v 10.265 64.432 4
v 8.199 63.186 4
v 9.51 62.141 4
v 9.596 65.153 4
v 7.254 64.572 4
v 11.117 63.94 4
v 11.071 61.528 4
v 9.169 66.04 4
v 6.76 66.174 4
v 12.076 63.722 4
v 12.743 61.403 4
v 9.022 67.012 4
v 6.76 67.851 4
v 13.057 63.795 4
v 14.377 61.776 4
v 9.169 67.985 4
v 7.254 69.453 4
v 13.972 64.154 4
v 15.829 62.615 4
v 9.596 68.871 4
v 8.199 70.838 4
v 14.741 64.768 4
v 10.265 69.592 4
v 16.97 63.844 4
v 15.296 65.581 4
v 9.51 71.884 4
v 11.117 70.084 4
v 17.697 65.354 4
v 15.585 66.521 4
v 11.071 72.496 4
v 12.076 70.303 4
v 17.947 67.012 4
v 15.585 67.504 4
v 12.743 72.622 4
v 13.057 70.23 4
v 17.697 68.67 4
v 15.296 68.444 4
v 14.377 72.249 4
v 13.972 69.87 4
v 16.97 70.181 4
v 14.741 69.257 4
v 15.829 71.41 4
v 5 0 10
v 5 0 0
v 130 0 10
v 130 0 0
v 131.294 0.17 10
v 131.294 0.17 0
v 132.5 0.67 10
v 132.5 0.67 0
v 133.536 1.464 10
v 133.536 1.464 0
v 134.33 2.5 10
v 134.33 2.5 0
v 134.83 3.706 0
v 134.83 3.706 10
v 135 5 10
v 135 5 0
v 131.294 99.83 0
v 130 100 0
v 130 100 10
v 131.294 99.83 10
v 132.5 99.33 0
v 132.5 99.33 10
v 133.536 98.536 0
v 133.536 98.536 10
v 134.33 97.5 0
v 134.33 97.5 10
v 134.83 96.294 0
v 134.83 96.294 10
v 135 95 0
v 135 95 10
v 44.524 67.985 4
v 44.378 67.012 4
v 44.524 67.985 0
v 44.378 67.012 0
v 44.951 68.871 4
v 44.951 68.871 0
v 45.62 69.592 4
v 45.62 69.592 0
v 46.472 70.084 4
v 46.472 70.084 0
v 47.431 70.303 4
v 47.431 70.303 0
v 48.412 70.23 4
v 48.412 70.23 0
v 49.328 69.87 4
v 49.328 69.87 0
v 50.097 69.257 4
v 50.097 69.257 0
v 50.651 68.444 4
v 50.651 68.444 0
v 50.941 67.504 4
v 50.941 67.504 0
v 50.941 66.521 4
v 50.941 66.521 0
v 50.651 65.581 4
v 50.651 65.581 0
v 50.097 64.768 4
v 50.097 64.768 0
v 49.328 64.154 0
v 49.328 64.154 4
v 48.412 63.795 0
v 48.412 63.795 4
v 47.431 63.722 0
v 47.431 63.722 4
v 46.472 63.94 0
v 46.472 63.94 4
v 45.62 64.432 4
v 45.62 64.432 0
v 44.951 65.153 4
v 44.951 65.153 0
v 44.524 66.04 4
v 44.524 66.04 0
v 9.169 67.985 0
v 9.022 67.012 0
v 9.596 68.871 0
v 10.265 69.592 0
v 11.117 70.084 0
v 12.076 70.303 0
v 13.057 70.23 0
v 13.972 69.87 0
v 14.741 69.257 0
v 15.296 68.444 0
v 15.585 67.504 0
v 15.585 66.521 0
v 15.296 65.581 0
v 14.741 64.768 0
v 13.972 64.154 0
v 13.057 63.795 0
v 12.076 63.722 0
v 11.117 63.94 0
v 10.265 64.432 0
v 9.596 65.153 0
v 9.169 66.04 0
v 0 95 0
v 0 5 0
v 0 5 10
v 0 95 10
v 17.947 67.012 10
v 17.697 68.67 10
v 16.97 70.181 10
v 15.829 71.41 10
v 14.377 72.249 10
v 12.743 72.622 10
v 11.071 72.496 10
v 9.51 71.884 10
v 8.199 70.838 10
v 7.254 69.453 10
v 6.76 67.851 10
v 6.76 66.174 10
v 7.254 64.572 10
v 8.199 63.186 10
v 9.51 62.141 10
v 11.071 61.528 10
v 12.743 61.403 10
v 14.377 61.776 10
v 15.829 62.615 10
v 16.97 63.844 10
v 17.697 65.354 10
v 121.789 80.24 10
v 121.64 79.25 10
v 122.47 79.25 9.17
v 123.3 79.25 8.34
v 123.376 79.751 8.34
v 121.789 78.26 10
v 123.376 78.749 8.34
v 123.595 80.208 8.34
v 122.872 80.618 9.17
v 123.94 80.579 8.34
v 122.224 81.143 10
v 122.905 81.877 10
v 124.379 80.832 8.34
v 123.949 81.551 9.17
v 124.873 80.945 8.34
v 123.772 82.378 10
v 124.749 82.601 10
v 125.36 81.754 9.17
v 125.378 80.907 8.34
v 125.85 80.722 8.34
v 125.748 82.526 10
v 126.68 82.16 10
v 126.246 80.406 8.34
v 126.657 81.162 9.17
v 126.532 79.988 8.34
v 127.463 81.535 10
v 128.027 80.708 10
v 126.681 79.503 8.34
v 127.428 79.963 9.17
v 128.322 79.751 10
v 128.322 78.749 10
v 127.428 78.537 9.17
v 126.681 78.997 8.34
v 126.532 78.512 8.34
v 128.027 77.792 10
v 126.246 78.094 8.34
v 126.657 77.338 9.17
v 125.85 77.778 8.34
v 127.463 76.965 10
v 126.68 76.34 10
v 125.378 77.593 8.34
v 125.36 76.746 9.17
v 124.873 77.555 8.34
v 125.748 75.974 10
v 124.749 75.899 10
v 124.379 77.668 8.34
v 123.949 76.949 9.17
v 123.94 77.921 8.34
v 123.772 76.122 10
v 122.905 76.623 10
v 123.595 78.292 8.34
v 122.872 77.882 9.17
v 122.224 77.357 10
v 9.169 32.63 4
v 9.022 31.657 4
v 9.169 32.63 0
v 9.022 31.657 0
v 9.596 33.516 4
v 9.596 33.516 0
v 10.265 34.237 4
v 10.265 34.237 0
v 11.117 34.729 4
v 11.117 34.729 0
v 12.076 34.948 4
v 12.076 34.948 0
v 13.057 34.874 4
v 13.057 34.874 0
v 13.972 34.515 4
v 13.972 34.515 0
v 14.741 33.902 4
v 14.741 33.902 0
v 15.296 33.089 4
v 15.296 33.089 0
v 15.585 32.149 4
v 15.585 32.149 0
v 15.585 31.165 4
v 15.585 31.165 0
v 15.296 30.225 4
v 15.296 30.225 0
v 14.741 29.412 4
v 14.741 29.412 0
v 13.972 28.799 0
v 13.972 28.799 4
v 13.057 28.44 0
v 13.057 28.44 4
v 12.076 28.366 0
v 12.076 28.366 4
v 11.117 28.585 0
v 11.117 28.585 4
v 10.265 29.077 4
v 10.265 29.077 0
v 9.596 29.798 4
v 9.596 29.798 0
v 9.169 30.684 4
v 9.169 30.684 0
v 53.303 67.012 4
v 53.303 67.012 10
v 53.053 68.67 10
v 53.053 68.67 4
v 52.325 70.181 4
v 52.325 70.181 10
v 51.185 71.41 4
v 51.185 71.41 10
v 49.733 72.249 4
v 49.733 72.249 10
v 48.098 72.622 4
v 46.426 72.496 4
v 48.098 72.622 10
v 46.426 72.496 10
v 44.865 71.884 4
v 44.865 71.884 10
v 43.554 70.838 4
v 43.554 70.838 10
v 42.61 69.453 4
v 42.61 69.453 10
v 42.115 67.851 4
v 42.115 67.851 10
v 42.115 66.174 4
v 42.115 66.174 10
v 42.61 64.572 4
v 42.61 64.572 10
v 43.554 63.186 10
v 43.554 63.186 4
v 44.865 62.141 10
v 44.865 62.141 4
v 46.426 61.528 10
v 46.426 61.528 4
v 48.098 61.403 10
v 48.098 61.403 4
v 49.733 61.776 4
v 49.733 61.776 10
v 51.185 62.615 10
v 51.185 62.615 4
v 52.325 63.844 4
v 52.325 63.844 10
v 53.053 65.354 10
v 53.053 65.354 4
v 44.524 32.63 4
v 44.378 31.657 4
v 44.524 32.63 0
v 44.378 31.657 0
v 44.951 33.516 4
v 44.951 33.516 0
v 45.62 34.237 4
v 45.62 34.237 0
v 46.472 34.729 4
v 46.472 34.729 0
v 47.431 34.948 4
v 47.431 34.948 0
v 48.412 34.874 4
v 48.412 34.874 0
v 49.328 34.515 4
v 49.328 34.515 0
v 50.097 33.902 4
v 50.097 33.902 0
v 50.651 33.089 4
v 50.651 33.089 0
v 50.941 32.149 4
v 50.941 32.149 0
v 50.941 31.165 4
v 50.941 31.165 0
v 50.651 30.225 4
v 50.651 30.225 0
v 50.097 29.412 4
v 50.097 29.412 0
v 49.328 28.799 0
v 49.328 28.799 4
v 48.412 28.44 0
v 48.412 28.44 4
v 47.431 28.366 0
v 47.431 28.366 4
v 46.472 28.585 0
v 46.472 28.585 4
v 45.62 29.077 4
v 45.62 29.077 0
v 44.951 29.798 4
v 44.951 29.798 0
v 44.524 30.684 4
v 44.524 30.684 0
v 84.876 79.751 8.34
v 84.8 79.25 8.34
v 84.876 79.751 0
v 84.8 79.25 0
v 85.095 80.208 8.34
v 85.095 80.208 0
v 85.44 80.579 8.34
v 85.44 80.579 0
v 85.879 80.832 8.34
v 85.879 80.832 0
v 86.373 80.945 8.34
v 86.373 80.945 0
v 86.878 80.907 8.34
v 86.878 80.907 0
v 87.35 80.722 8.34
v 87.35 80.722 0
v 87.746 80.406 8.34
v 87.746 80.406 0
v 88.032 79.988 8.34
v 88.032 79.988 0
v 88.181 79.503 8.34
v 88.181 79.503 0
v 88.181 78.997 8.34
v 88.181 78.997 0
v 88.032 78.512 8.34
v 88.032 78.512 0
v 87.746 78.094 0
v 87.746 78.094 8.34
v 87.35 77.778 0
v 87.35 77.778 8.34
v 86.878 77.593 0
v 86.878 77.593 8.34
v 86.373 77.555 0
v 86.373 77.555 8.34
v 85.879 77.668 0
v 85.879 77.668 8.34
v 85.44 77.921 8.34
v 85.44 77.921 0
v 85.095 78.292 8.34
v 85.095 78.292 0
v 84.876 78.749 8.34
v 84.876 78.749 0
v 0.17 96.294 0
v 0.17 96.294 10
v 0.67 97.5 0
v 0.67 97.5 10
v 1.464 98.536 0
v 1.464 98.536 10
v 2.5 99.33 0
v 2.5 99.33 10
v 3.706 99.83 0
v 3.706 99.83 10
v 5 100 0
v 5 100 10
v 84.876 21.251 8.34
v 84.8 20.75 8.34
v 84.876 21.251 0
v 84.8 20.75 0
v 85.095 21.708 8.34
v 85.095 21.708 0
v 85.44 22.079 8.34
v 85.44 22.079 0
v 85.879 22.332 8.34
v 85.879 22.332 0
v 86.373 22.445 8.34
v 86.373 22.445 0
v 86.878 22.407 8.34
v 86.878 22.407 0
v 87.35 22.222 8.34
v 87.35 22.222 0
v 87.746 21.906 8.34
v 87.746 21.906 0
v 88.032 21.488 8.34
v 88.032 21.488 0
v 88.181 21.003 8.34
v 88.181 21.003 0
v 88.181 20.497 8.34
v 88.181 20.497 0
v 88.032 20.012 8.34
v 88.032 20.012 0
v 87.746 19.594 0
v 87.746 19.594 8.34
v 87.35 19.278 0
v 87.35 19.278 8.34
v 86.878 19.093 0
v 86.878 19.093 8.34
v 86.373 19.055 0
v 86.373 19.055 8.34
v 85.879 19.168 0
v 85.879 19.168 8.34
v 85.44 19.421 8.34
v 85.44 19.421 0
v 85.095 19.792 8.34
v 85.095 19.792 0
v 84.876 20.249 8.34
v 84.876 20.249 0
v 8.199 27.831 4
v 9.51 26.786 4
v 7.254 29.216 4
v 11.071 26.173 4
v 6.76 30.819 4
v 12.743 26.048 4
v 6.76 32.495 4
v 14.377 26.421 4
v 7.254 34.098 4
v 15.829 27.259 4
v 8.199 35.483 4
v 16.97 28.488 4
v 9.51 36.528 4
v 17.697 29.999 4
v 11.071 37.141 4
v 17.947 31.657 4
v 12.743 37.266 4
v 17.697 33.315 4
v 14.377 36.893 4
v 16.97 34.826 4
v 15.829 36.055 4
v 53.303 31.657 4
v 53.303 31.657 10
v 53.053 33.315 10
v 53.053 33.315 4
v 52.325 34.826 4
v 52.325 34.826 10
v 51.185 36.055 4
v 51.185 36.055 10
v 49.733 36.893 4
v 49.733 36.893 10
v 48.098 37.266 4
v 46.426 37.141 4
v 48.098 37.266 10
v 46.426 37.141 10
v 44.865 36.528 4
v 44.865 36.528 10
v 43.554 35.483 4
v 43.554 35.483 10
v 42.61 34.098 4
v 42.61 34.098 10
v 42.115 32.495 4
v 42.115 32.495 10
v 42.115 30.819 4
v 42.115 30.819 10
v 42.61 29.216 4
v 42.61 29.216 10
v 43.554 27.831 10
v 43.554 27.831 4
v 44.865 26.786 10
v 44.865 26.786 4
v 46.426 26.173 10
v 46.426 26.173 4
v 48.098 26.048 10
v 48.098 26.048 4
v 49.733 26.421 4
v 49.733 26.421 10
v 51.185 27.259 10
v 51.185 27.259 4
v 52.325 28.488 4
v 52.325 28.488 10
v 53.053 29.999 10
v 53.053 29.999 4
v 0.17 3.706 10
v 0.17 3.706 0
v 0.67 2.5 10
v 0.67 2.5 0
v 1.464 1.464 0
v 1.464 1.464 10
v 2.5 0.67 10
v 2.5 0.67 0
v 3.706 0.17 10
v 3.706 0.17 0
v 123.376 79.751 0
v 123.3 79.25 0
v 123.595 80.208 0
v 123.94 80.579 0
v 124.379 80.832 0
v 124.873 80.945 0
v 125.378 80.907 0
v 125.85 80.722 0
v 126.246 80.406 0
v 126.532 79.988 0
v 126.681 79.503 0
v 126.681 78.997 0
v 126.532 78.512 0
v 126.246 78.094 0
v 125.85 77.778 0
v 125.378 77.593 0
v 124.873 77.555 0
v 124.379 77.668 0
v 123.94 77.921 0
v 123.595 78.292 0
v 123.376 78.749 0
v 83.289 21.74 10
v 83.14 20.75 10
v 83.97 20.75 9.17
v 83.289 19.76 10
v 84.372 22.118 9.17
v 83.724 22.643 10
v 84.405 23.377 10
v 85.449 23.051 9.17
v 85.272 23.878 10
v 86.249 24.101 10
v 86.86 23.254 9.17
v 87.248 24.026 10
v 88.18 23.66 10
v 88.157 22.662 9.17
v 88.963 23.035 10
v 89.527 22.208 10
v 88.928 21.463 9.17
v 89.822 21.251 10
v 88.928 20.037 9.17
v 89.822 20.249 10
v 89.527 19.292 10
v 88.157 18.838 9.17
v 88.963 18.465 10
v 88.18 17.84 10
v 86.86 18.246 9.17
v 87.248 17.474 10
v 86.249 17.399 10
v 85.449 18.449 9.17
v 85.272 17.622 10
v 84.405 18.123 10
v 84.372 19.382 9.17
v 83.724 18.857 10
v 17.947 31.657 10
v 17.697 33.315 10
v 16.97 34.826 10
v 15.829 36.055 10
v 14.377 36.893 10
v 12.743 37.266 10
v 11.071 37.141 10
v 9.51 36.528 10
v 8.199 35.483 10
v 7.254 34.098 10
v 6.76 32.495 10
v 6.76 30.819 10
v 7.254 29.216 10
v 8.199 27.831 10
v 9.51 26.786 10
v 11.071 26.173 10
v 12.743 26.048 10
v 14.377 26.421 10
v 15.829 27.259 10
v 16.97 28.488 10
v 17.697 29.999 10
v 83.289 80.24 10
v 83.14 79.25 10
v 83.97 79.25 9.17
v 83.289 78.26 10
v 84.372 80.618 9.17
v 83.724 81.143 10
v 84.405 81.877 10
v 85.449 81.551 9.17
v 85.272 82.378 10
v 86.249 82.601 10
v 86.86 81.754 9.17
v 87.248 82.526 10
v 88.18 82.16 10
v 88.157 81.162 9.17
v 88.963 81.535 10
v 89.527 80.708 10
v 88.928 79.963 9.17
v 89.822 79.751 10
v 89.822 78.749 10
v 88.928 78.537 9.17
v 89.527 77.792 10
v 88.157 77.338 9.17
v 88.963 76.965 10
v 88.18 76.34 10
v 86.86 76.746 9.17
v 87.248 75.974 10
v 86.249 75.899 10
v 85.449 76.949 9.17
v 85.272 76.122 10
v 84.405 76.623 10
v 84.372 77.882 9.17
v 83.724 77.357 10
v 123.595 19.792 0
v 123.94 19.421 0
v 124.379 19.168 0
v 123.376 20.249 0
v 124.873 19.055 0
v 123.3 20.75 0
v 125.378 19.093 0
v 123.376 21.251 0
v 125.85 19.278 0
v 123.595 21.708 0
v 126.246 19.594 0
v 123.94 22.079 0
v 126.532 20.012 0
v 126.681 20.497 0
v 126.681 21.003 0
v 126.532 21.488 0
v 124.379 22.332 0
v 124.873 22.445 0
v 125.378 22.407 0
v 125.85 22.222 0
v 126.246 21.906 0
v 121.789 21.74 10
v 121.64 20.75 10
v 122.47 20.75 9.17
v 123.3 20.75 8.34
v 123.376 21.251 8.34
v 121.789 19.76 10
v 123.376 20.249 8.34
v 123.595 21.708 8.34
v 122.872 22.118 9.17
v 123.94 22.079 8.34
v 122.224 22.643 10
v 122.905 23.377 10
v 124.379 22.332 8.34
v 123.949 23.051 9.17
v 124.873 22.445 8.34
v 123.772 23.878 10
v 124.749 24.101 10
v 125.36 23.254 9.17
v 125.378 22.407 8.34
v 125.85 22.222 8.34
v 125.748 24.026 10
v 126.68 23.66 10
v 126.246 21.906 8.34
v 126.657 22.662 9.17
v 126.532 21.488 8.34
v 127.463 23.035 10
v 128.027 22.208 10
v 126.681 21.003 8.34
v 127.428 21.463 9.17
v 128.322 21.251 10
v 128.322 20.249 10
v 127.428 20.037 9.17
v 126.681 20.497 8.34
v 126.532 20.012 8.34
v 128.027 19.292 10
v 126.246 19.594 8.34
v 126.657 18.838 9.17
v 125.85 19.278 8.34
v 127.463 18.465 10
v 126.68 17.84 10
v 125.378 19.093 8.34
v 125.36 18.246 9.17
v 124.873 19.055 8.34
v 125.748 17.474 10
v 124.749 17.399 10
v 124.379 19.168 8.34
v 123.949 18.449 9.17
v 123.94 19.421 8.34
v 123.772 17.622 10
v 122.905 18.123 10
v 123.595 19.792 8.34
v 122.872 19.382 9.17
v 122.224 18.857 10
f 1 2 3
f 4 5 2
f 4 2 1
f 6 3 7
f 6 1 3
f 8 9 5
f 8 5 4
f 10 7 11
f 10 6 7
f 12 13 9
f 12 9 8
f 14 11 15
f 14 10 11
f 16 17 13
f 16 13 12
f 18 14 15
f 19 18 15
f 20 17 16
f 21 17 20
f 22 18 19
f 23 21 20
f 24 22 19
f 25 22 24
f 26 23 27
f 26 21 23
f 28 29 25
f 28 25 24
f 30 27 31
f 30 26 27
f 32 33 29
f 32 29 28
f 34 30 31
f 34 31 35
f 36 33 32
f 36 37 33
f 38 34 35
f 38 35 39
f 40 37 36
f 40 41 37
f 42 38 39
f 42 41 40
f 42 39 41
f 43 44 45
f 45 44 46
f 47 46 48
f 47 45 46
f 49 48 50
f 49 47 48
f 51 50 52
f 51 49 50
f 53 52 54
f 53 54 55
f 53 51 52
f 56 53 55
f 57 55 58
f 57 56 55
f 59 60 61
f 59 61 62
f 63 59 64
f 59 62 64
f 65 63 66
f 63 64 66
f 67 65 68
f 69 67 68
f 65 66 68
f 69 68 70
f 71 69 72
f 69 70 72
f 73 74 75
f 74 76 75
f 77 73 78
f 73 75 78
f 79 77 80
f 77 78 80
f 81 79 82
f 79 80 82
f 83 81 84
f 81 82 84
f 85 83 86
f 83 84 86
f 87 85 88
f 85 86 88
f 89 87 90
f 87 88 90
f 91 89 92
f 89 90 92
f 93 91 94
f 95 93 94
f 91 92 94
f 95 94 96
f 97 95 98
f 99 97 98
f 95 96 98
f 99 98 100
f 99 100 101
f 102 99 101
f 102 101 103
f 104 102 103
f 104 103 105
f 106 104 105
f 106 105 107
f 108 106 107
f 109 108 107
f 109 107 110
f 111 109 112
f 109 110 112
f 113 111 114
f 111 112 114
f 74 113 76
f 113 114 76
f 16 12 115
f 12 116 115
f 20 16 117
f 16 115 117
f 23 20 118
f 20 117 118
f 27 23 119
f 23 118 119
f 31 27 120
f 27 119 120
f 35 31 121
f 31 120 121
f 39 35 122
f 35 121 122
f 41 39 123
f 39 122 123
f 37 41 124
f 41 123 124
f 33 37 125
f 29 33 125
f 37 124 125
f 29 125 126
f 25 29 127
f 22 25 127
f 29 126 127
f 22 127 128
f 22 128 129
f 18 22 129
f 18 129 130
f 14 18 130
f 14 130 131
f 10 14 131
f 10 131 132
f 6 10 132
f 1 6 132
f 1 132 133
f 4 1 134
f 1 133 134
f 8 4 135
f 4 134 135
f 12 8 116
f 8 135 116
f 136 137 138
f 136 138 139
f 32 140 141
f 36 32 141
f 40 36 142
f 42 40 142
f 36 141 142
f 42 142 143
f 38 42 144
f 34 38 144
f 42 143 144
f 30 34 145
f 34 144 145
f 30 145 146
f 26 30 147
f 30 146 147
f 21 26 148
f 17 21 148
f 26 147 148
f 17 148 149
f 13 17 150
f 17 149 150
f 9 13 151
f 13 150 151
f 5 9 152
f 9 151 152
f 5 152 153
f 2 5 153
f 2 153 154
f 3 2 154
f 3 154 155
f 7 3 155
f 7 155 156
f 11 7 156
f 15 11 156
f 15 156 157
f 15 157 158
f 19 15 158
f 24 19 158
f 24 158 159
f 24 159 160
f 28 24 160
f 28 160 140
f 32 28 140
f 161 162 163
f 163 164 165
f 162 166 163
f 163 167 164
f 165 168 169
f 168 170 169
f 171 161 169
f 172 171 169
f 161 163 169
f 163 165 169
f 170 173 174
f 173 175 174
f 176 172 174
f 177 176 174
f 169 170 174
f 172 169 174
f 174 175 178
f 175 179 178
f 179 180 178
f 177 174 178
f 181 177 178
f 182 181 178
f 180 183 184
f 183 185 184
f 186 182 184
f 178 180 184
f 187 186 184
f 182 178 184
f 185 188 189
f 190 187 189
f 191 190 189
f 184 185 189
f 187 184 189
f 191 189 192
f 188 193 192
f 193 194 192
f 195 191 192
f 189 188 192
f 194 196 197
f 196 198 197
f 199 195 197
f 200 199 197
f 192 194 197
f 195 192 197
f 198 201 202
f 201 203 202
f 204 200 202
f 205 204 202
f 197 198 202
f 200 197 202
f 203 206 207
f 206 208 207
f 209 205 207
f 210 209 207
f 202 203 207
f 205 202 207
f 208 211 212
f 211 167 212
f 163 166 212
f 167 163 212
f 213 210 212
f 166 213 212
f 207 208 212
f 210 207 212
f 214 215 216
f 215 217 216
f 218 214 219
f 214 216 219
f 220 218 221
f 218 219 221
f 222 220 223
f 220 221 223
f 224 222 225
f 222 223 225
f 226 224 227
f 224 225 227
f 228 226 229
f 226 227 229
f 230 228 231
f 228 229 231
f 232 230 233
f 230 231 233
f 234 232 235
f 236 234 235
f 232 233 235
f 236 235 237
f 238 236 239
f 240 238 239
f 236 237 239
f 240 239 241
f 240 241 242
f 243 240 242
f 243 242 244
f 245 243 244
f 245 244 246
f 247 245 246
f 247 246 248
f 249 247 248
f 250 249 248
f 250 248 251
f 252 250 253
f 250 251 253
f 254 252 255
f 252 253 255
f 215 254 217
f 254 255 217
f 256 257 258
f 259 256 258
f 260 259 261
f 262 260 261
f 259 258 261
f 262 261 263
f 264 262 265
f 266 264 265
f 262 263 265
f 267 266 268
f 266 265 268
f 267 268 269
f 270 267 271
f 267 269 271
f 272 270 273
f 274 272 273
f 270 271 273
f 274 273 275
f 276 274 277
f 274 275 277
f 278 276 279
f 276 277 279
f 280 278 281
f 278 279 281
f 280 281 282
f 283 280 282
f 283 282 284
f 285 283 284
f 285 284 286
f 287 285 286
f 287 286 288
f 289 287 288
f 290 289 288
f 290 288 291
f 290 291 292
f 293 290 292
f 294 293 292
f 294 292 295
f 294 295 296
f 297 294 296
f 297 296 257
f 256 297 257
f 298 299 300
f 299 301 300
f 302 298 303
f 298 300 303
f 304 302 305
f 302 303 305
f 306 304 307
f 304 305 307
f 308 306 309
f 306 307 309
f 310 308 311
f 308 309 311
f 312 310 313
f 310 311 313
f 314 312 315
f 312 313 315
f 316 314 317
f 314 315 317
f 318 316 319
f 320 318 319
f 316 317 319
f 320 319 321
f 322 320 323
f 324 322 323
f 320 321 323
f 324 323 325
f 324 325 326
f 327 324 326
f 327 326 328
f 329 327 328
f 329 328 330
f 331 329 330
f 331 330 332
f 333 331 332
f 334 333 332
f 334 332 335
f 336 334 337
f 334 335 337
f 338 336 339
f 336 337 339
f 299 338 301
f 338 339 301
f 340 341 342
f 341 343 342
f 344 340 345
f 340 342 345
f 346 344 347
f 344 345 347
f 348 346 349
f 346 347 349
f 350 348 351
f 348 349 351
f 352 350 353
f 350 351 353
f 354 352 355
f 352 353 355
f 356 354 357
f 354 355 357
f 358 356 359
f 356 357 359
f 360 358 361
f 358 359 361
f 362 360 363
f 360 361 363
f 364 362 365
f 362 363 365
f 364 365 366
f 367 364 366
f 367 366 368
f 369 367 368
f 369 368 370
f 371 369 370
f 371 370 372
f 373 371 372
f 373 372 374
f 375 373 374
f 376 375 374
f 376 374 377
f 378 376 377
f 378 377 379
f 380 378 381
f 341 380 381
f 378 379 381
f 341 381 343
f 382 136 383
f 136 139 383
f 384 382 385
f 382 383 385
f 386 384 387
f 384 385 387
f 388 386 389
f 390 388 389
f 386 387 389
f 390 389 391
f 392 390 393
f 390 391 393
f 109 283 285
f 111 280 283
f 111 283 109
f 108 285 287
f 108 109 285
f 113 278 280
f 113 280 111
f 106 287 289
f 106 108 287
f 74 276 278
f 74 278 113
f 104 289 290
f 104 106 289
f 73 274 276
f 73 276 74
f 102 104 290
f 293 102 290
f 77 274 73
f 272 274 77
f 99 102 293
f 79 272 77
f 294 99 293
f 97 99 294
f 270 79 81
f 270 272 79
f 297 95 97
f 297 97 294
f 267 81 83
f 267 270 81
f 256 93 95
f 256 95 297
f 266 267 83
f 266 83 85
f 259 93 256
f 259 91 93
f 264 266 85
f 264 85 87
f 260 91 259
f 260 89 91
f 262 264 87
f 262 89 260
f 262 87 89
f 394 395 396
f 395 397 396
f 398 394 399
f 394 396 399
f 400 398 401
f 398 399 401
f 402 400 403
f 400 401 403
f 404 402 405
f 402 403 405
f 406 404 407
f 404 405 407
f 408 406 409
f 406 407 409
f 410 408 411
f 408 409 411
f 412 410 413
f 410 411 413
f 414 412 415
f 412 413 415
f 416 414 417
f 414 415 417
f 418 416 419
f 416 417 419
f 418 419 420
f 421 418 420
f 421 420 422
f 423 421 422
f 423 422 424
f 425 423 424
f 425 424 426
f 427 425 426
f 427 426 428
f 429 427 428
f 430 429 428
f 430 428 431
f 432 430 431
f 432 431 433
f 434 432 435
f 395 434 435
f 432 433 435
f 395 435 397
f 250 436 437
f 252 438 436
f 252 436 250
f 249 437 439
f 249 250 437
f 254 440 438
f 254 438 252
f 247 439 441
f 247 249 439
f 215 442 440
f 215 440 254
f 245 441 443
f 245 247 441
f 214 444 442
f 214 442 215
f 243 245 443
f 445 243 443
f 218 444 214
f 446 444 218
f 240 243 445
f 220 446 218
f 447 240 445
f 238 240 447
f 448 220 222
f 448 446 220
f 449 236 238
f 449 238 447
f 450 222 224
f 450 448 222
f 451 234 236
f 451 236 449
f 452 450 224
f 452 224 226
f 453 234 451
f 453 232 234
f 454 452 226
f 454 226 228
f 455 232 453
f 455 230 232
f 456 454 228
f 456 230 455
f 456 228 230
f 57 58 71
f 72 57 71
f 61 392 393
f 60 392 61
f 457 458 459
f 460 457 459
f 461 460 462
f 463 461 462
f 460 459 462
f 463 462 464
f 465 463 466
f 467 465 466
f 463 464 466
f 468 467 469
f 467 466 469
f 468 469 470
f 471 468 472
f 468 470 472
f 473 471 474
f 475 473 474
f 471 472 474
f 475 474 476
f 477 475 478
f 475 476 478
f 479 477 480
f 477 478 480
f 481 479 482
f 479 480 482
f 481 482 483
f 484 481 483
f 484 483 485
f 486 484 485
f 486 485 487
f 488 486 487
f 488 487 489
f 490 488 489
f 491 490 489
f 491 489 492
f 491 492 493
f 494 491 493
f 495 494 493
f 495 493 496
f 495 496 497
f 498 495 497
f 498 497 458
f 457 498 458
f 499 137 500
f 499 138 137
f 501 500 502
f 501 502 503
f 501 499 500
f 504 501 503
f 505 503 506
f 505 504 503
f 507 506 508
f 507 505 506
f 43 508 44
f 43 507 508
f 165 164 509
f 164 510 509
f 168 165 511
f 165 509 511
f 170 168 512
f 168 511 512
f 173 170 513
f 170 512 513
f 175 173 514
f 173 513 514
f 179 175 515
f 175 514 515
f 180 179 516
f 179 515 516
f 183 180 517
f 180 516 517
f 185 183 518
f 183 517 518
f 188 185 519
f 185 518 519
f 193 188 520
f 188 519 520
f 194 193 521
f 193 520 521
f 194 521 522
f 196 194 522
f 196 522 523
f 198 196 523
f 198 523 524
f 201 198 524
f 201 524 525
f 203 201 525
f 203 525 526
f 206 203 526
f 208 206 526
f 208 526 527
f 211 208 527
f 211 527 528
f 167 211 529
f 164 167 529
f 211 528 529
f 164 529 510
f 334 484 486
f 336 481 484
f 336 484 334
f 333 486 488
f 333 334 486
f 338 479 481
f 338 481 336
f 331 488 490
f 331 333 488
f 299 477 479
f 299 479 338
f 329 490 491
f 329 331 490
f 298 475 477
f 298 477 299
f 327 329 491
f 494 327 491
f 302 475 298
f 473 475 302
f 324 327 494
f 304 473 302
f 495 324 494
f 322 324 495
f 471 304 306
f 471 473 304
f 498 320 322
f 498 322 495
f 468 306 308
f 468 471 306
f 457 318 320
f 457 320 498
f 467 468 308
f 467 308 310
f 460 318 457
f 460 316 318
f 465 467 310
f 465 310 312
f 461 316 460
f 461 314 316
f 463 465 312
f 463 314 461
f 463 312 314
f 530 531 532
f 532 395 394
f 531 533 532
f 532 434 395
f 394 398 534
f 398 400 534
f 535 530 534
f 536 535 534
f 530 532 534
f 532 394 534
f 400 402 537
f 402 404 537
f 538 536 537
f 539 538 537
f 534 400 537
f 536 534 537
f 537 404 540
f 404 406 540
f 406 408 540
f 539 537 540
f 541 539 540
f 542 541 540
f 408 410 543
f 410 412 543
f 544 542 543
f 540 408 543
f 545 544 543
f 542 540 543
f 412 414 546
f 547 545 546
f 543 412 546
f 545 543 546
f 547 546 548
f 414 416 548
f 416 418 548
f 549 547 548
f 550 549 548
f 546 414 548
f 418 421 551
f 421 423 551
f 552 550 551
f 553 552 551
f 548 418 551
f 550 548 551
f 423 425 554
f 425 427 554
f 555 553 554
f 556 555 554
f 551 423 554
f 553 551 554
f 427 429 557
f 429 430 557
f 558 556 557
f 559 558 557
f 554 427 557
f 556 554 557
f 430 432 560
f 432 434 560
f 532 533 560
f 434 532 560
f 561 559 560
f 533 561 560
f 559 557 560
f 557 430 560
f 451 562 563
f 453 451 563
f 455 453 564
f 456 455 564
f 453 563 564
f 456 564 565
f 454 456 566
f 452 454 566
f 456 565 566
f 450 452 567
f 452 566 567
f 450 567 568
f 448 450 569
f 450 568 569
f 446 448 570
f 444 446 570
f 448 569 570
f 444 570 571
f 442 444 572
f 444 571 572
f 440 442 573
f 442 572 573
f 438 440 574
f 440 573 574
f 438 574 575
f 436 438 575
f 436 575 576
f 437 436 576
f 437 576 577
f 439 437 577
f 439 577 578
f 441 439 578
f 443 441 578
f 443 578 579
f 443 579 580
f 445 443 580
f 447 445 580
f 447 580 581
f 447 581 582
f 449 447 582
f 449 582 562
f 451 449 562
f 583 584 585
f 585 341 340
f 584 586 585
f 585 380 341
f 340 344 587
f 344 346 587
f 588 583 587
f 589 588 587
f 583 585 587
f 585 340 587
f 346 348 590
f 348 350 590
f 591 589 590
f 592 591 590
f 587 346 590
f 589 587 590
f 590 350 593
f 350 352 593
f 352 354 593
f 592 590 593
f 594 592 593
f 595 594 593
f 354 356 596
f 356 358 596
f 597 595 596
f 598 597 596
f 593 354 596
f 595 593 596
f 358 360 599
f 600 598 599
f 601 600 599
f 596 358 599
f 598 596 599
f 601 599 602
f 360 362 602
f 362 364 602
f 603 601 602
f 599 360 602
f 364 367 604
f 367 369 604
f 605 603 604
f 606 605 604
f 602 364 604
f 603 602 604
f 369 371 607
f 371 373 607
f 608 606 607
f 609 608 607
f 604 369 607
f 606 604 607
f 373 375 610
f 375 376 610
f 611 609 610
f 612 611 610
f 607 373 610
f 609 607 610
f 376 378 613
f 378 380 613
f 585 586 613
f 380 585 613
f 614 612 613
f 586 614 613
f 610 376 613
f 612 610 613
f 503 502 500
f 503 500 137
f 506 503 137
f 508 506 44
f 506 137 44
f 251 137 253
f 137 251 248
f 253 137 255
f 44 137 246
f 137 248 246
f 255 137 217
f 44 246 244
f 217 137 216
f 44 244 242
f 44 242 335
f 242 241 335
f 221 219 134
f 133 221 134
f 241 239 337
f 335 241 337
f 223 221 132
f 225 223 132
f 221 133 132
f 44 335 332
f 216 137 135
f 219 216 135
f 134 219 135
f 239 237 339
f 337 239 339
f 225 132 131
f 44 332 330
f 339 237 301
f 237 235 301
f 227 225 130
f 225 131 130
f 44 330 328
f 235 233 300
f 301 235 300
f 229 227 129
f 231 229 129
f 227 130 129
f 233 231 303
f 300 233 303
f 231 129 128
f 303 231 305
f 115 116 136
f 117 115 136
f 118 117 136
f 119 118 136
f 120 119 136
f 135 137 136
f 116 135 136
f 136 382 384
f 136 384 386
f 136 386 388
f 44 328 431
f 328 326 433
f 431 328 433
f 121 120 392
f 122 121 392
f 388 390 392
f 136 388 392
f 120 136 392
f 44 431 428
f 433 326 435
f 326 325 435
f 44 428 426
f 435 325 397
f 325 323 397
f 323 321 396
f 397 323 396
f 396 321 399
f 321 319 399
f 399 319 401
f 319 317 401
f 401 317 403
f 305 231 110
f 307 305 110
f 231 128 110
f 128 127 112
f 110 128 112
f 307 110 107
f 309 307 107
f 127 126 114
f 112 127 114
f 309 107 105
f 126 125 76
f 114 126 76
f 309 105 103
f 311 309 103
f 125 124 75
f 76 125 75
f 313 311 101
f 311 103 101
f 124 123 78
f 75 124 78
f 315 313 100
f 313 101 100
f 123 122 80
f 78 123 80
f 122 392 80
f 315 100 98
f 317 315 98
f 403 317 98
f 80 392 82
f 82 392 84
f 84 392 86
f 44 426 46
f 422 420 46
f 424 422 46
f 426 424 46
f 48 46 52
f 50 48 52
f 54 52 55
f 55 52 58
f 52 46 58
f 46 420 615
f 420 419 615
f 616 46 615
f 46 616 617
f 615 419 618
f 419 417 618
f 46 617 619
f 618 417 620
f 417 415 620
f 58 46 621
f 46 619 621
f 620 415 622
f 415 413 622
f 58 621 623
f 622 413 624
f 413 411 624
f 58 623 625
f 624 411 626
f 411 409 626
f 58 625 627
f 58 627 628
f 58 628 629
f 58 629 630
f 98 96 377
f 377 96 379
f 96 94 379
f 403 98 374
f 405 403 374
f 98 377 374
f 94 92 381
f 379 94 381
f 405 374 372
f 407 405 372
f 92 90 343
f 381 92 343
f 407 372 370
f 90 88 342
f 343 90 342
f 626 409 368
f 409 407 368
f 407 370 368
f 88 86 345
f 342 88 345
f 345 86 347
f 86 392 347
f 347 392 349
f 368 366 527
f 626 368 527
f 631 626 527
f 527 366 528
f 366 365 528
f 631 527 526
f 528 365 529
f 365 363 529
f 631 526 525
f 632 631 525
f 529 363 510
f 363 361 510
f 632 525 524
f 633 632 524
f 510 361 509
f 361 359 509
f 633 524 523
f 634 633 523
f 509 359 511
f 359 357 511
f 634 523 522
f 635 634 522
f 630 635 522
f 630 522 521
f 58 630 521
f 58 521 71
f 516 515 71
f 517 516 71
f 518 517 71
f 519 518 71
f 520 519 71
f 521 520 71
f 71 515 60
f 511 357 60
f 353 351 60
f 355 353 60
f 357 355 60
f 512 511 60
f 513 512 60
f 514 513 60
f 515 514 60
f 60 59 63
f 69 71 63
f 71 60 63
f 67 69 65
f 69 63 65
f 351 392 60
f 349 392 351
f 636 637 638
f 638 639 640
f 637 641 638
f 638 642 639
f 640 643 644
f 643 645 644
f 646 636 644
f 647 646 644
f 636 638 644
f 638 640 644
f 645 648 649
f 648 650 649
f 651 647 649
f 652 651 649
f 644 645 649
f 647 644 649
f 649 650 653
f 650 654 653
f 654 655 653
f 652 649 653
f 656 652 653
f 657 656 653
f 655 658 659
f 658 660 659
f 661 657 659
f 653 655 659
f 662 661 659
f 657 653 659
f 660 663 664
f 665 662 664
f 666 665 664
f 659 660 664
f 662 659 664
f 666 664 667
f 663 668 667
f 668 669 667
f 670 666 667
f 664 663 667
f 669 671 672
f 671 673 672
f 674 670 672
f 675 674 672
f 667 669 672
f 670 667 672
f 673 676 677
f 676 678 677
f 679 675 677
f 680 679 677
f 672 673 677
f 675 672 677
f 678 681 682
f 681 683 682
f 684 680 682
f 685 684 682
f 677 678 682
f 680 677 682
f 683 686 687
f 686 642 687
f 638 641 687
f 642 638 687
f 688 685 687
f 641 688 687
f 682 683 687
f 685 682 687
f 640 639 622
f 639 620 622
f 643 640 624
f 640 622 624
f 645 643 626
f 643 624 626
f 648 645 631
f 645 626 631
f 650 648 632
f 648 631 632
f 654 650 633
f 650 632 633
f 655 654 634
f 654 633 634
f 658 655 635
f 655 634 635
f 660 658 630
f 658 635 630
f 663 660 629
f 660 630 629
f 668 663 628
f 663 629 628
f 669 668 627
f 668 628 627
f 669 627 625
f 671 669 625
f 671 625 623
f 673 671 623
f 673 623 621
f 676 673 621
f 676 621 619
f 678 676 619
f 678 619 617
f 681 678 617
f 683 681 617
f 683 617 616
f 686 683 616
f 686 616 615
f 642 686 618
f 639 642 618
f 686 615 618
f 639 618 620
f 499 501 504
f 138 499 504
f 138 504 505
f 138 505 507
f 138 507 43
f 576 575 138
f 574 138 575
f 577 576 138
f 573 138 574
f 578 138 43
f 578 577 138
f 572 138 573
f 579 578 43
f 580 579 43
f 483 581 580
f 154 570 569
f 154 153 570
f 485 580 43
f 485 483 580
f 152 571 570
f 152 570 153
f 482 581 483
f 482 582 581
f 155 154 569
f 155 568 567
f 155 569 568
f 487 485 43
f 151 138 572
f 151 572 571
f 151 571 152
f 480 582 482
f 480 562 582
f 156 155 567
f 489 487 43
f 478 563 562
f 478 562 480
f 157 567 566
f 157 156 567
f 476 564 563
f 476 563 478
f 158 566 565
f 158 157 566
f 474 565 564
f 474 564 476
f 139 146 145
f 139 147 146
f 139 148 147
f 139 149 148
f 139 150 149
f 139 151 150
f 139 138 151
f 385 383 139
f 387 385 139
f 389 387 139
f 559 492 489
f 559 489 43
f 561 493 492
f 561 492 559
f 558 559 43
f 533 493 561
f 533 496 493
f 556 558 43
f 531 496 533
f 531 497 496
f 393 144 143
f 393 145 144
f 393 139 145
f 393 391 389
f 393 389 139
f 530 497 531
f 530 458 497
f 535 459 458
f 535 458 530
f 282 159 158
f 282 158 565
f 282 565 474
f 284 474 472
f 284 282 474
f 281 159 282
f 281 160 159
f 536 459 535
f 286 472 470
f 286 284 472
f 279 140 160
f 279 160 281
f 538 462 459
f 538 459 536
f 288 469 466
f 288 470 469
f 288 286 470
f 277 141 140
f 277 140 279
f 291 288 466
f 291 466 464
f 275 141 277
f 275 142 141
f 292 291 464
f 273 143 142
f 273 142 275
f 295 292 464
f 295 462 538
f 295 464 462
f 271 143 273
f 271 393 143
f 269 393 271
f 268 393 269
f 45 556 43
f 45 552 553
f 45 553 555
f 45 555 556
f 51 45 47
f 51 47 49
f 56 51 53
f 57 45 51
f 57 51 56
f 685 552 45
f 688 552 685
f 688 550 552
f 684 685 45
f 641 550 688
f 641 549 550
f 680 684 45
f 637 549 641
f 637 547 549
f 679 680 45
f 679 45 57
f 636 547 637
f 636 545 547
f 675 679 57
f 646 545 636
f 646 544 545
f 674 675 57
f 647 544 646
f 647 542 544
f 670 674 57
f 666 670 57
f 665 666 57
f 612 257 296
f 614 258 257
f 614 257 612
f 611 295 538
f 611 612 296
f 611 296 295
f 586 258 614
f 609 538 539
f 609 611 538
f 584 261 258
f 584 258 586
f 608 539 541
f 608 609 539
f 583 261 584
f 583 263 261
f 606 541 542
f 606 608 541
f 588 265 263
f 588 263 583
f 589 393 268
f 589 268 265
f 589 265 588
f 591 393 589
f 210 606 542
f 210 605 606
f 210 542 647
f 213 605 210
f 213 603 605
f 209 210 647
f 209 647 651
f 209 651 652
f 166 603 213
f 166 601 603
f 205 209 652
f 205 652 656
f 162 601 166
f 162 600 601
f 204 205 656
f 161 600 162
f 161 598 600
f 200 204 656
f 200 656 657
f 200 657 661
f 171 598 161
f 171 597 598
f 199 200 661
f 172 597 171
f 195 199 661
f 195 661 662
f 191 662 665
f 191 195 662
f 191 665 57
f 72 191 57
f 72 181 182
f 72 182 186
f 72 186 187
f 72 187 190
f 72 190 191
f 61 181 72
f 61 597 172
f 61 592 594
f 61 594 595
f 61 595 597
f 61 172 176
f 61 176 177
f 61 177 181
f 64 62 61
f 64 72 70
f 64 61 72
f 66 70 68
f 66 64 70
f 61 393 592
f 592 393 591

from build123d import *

# Parameters (mm, degrees)
F0_W           = 135
F0_H           = 100
F1_DEPTH       = 10
F4_D           = 6.6
F4_CBORE_D     = 11.25
F4_CBORE_DEPTH = 6
F5_R           = 5
F7_D           = 3.4
F7_CSINK_D     = 6.72
F7_CSINK_ANGLE = 90


with BuildPart() as f1:
    # F0 (on Top) → F1 (new body)
    with BuildSketch(Plane.XY):
        with Locations((67.5, 50)):
            Rectangle(F0_W, F0_H)
    extrude(amount=F1_DEPTH)

    # F4 (through all)
    with Locations(Plane.XY.offset(10)):
        with Locations((12.3223304703, 67.0123483286), (47.6776695297, 67.0123483286), (47.6776695297, 31.6570092693), (12.3223304703, 31.6570092693)):
            CounterBoreHole(F4_D / 2, F4_CBORE_D / 2, F4_CBORE_DEPTH)

    # F5
    f5_edges = [f1.edges().sort_by_distance(p)[0] for p in [
        (0, 100, 5),
        (135, 100, 5),
        (135, 0, 5),
        (0, 0, 5),
    ]]
    fillet(f5_edges, radius=F5_R)

    # F7 (through all)
    with Locations(Plane.XY.offset(10)):
        with Locations((86.5, 20.75), (86.5, 79.25), (125, 79.25), (125, 20.75)):
            CounterSinkHole(F7_D / 2, F7_CSINK_D / 2, counter_sink_angle=F7_CSINK_ANGLE)


solid = f1.part
